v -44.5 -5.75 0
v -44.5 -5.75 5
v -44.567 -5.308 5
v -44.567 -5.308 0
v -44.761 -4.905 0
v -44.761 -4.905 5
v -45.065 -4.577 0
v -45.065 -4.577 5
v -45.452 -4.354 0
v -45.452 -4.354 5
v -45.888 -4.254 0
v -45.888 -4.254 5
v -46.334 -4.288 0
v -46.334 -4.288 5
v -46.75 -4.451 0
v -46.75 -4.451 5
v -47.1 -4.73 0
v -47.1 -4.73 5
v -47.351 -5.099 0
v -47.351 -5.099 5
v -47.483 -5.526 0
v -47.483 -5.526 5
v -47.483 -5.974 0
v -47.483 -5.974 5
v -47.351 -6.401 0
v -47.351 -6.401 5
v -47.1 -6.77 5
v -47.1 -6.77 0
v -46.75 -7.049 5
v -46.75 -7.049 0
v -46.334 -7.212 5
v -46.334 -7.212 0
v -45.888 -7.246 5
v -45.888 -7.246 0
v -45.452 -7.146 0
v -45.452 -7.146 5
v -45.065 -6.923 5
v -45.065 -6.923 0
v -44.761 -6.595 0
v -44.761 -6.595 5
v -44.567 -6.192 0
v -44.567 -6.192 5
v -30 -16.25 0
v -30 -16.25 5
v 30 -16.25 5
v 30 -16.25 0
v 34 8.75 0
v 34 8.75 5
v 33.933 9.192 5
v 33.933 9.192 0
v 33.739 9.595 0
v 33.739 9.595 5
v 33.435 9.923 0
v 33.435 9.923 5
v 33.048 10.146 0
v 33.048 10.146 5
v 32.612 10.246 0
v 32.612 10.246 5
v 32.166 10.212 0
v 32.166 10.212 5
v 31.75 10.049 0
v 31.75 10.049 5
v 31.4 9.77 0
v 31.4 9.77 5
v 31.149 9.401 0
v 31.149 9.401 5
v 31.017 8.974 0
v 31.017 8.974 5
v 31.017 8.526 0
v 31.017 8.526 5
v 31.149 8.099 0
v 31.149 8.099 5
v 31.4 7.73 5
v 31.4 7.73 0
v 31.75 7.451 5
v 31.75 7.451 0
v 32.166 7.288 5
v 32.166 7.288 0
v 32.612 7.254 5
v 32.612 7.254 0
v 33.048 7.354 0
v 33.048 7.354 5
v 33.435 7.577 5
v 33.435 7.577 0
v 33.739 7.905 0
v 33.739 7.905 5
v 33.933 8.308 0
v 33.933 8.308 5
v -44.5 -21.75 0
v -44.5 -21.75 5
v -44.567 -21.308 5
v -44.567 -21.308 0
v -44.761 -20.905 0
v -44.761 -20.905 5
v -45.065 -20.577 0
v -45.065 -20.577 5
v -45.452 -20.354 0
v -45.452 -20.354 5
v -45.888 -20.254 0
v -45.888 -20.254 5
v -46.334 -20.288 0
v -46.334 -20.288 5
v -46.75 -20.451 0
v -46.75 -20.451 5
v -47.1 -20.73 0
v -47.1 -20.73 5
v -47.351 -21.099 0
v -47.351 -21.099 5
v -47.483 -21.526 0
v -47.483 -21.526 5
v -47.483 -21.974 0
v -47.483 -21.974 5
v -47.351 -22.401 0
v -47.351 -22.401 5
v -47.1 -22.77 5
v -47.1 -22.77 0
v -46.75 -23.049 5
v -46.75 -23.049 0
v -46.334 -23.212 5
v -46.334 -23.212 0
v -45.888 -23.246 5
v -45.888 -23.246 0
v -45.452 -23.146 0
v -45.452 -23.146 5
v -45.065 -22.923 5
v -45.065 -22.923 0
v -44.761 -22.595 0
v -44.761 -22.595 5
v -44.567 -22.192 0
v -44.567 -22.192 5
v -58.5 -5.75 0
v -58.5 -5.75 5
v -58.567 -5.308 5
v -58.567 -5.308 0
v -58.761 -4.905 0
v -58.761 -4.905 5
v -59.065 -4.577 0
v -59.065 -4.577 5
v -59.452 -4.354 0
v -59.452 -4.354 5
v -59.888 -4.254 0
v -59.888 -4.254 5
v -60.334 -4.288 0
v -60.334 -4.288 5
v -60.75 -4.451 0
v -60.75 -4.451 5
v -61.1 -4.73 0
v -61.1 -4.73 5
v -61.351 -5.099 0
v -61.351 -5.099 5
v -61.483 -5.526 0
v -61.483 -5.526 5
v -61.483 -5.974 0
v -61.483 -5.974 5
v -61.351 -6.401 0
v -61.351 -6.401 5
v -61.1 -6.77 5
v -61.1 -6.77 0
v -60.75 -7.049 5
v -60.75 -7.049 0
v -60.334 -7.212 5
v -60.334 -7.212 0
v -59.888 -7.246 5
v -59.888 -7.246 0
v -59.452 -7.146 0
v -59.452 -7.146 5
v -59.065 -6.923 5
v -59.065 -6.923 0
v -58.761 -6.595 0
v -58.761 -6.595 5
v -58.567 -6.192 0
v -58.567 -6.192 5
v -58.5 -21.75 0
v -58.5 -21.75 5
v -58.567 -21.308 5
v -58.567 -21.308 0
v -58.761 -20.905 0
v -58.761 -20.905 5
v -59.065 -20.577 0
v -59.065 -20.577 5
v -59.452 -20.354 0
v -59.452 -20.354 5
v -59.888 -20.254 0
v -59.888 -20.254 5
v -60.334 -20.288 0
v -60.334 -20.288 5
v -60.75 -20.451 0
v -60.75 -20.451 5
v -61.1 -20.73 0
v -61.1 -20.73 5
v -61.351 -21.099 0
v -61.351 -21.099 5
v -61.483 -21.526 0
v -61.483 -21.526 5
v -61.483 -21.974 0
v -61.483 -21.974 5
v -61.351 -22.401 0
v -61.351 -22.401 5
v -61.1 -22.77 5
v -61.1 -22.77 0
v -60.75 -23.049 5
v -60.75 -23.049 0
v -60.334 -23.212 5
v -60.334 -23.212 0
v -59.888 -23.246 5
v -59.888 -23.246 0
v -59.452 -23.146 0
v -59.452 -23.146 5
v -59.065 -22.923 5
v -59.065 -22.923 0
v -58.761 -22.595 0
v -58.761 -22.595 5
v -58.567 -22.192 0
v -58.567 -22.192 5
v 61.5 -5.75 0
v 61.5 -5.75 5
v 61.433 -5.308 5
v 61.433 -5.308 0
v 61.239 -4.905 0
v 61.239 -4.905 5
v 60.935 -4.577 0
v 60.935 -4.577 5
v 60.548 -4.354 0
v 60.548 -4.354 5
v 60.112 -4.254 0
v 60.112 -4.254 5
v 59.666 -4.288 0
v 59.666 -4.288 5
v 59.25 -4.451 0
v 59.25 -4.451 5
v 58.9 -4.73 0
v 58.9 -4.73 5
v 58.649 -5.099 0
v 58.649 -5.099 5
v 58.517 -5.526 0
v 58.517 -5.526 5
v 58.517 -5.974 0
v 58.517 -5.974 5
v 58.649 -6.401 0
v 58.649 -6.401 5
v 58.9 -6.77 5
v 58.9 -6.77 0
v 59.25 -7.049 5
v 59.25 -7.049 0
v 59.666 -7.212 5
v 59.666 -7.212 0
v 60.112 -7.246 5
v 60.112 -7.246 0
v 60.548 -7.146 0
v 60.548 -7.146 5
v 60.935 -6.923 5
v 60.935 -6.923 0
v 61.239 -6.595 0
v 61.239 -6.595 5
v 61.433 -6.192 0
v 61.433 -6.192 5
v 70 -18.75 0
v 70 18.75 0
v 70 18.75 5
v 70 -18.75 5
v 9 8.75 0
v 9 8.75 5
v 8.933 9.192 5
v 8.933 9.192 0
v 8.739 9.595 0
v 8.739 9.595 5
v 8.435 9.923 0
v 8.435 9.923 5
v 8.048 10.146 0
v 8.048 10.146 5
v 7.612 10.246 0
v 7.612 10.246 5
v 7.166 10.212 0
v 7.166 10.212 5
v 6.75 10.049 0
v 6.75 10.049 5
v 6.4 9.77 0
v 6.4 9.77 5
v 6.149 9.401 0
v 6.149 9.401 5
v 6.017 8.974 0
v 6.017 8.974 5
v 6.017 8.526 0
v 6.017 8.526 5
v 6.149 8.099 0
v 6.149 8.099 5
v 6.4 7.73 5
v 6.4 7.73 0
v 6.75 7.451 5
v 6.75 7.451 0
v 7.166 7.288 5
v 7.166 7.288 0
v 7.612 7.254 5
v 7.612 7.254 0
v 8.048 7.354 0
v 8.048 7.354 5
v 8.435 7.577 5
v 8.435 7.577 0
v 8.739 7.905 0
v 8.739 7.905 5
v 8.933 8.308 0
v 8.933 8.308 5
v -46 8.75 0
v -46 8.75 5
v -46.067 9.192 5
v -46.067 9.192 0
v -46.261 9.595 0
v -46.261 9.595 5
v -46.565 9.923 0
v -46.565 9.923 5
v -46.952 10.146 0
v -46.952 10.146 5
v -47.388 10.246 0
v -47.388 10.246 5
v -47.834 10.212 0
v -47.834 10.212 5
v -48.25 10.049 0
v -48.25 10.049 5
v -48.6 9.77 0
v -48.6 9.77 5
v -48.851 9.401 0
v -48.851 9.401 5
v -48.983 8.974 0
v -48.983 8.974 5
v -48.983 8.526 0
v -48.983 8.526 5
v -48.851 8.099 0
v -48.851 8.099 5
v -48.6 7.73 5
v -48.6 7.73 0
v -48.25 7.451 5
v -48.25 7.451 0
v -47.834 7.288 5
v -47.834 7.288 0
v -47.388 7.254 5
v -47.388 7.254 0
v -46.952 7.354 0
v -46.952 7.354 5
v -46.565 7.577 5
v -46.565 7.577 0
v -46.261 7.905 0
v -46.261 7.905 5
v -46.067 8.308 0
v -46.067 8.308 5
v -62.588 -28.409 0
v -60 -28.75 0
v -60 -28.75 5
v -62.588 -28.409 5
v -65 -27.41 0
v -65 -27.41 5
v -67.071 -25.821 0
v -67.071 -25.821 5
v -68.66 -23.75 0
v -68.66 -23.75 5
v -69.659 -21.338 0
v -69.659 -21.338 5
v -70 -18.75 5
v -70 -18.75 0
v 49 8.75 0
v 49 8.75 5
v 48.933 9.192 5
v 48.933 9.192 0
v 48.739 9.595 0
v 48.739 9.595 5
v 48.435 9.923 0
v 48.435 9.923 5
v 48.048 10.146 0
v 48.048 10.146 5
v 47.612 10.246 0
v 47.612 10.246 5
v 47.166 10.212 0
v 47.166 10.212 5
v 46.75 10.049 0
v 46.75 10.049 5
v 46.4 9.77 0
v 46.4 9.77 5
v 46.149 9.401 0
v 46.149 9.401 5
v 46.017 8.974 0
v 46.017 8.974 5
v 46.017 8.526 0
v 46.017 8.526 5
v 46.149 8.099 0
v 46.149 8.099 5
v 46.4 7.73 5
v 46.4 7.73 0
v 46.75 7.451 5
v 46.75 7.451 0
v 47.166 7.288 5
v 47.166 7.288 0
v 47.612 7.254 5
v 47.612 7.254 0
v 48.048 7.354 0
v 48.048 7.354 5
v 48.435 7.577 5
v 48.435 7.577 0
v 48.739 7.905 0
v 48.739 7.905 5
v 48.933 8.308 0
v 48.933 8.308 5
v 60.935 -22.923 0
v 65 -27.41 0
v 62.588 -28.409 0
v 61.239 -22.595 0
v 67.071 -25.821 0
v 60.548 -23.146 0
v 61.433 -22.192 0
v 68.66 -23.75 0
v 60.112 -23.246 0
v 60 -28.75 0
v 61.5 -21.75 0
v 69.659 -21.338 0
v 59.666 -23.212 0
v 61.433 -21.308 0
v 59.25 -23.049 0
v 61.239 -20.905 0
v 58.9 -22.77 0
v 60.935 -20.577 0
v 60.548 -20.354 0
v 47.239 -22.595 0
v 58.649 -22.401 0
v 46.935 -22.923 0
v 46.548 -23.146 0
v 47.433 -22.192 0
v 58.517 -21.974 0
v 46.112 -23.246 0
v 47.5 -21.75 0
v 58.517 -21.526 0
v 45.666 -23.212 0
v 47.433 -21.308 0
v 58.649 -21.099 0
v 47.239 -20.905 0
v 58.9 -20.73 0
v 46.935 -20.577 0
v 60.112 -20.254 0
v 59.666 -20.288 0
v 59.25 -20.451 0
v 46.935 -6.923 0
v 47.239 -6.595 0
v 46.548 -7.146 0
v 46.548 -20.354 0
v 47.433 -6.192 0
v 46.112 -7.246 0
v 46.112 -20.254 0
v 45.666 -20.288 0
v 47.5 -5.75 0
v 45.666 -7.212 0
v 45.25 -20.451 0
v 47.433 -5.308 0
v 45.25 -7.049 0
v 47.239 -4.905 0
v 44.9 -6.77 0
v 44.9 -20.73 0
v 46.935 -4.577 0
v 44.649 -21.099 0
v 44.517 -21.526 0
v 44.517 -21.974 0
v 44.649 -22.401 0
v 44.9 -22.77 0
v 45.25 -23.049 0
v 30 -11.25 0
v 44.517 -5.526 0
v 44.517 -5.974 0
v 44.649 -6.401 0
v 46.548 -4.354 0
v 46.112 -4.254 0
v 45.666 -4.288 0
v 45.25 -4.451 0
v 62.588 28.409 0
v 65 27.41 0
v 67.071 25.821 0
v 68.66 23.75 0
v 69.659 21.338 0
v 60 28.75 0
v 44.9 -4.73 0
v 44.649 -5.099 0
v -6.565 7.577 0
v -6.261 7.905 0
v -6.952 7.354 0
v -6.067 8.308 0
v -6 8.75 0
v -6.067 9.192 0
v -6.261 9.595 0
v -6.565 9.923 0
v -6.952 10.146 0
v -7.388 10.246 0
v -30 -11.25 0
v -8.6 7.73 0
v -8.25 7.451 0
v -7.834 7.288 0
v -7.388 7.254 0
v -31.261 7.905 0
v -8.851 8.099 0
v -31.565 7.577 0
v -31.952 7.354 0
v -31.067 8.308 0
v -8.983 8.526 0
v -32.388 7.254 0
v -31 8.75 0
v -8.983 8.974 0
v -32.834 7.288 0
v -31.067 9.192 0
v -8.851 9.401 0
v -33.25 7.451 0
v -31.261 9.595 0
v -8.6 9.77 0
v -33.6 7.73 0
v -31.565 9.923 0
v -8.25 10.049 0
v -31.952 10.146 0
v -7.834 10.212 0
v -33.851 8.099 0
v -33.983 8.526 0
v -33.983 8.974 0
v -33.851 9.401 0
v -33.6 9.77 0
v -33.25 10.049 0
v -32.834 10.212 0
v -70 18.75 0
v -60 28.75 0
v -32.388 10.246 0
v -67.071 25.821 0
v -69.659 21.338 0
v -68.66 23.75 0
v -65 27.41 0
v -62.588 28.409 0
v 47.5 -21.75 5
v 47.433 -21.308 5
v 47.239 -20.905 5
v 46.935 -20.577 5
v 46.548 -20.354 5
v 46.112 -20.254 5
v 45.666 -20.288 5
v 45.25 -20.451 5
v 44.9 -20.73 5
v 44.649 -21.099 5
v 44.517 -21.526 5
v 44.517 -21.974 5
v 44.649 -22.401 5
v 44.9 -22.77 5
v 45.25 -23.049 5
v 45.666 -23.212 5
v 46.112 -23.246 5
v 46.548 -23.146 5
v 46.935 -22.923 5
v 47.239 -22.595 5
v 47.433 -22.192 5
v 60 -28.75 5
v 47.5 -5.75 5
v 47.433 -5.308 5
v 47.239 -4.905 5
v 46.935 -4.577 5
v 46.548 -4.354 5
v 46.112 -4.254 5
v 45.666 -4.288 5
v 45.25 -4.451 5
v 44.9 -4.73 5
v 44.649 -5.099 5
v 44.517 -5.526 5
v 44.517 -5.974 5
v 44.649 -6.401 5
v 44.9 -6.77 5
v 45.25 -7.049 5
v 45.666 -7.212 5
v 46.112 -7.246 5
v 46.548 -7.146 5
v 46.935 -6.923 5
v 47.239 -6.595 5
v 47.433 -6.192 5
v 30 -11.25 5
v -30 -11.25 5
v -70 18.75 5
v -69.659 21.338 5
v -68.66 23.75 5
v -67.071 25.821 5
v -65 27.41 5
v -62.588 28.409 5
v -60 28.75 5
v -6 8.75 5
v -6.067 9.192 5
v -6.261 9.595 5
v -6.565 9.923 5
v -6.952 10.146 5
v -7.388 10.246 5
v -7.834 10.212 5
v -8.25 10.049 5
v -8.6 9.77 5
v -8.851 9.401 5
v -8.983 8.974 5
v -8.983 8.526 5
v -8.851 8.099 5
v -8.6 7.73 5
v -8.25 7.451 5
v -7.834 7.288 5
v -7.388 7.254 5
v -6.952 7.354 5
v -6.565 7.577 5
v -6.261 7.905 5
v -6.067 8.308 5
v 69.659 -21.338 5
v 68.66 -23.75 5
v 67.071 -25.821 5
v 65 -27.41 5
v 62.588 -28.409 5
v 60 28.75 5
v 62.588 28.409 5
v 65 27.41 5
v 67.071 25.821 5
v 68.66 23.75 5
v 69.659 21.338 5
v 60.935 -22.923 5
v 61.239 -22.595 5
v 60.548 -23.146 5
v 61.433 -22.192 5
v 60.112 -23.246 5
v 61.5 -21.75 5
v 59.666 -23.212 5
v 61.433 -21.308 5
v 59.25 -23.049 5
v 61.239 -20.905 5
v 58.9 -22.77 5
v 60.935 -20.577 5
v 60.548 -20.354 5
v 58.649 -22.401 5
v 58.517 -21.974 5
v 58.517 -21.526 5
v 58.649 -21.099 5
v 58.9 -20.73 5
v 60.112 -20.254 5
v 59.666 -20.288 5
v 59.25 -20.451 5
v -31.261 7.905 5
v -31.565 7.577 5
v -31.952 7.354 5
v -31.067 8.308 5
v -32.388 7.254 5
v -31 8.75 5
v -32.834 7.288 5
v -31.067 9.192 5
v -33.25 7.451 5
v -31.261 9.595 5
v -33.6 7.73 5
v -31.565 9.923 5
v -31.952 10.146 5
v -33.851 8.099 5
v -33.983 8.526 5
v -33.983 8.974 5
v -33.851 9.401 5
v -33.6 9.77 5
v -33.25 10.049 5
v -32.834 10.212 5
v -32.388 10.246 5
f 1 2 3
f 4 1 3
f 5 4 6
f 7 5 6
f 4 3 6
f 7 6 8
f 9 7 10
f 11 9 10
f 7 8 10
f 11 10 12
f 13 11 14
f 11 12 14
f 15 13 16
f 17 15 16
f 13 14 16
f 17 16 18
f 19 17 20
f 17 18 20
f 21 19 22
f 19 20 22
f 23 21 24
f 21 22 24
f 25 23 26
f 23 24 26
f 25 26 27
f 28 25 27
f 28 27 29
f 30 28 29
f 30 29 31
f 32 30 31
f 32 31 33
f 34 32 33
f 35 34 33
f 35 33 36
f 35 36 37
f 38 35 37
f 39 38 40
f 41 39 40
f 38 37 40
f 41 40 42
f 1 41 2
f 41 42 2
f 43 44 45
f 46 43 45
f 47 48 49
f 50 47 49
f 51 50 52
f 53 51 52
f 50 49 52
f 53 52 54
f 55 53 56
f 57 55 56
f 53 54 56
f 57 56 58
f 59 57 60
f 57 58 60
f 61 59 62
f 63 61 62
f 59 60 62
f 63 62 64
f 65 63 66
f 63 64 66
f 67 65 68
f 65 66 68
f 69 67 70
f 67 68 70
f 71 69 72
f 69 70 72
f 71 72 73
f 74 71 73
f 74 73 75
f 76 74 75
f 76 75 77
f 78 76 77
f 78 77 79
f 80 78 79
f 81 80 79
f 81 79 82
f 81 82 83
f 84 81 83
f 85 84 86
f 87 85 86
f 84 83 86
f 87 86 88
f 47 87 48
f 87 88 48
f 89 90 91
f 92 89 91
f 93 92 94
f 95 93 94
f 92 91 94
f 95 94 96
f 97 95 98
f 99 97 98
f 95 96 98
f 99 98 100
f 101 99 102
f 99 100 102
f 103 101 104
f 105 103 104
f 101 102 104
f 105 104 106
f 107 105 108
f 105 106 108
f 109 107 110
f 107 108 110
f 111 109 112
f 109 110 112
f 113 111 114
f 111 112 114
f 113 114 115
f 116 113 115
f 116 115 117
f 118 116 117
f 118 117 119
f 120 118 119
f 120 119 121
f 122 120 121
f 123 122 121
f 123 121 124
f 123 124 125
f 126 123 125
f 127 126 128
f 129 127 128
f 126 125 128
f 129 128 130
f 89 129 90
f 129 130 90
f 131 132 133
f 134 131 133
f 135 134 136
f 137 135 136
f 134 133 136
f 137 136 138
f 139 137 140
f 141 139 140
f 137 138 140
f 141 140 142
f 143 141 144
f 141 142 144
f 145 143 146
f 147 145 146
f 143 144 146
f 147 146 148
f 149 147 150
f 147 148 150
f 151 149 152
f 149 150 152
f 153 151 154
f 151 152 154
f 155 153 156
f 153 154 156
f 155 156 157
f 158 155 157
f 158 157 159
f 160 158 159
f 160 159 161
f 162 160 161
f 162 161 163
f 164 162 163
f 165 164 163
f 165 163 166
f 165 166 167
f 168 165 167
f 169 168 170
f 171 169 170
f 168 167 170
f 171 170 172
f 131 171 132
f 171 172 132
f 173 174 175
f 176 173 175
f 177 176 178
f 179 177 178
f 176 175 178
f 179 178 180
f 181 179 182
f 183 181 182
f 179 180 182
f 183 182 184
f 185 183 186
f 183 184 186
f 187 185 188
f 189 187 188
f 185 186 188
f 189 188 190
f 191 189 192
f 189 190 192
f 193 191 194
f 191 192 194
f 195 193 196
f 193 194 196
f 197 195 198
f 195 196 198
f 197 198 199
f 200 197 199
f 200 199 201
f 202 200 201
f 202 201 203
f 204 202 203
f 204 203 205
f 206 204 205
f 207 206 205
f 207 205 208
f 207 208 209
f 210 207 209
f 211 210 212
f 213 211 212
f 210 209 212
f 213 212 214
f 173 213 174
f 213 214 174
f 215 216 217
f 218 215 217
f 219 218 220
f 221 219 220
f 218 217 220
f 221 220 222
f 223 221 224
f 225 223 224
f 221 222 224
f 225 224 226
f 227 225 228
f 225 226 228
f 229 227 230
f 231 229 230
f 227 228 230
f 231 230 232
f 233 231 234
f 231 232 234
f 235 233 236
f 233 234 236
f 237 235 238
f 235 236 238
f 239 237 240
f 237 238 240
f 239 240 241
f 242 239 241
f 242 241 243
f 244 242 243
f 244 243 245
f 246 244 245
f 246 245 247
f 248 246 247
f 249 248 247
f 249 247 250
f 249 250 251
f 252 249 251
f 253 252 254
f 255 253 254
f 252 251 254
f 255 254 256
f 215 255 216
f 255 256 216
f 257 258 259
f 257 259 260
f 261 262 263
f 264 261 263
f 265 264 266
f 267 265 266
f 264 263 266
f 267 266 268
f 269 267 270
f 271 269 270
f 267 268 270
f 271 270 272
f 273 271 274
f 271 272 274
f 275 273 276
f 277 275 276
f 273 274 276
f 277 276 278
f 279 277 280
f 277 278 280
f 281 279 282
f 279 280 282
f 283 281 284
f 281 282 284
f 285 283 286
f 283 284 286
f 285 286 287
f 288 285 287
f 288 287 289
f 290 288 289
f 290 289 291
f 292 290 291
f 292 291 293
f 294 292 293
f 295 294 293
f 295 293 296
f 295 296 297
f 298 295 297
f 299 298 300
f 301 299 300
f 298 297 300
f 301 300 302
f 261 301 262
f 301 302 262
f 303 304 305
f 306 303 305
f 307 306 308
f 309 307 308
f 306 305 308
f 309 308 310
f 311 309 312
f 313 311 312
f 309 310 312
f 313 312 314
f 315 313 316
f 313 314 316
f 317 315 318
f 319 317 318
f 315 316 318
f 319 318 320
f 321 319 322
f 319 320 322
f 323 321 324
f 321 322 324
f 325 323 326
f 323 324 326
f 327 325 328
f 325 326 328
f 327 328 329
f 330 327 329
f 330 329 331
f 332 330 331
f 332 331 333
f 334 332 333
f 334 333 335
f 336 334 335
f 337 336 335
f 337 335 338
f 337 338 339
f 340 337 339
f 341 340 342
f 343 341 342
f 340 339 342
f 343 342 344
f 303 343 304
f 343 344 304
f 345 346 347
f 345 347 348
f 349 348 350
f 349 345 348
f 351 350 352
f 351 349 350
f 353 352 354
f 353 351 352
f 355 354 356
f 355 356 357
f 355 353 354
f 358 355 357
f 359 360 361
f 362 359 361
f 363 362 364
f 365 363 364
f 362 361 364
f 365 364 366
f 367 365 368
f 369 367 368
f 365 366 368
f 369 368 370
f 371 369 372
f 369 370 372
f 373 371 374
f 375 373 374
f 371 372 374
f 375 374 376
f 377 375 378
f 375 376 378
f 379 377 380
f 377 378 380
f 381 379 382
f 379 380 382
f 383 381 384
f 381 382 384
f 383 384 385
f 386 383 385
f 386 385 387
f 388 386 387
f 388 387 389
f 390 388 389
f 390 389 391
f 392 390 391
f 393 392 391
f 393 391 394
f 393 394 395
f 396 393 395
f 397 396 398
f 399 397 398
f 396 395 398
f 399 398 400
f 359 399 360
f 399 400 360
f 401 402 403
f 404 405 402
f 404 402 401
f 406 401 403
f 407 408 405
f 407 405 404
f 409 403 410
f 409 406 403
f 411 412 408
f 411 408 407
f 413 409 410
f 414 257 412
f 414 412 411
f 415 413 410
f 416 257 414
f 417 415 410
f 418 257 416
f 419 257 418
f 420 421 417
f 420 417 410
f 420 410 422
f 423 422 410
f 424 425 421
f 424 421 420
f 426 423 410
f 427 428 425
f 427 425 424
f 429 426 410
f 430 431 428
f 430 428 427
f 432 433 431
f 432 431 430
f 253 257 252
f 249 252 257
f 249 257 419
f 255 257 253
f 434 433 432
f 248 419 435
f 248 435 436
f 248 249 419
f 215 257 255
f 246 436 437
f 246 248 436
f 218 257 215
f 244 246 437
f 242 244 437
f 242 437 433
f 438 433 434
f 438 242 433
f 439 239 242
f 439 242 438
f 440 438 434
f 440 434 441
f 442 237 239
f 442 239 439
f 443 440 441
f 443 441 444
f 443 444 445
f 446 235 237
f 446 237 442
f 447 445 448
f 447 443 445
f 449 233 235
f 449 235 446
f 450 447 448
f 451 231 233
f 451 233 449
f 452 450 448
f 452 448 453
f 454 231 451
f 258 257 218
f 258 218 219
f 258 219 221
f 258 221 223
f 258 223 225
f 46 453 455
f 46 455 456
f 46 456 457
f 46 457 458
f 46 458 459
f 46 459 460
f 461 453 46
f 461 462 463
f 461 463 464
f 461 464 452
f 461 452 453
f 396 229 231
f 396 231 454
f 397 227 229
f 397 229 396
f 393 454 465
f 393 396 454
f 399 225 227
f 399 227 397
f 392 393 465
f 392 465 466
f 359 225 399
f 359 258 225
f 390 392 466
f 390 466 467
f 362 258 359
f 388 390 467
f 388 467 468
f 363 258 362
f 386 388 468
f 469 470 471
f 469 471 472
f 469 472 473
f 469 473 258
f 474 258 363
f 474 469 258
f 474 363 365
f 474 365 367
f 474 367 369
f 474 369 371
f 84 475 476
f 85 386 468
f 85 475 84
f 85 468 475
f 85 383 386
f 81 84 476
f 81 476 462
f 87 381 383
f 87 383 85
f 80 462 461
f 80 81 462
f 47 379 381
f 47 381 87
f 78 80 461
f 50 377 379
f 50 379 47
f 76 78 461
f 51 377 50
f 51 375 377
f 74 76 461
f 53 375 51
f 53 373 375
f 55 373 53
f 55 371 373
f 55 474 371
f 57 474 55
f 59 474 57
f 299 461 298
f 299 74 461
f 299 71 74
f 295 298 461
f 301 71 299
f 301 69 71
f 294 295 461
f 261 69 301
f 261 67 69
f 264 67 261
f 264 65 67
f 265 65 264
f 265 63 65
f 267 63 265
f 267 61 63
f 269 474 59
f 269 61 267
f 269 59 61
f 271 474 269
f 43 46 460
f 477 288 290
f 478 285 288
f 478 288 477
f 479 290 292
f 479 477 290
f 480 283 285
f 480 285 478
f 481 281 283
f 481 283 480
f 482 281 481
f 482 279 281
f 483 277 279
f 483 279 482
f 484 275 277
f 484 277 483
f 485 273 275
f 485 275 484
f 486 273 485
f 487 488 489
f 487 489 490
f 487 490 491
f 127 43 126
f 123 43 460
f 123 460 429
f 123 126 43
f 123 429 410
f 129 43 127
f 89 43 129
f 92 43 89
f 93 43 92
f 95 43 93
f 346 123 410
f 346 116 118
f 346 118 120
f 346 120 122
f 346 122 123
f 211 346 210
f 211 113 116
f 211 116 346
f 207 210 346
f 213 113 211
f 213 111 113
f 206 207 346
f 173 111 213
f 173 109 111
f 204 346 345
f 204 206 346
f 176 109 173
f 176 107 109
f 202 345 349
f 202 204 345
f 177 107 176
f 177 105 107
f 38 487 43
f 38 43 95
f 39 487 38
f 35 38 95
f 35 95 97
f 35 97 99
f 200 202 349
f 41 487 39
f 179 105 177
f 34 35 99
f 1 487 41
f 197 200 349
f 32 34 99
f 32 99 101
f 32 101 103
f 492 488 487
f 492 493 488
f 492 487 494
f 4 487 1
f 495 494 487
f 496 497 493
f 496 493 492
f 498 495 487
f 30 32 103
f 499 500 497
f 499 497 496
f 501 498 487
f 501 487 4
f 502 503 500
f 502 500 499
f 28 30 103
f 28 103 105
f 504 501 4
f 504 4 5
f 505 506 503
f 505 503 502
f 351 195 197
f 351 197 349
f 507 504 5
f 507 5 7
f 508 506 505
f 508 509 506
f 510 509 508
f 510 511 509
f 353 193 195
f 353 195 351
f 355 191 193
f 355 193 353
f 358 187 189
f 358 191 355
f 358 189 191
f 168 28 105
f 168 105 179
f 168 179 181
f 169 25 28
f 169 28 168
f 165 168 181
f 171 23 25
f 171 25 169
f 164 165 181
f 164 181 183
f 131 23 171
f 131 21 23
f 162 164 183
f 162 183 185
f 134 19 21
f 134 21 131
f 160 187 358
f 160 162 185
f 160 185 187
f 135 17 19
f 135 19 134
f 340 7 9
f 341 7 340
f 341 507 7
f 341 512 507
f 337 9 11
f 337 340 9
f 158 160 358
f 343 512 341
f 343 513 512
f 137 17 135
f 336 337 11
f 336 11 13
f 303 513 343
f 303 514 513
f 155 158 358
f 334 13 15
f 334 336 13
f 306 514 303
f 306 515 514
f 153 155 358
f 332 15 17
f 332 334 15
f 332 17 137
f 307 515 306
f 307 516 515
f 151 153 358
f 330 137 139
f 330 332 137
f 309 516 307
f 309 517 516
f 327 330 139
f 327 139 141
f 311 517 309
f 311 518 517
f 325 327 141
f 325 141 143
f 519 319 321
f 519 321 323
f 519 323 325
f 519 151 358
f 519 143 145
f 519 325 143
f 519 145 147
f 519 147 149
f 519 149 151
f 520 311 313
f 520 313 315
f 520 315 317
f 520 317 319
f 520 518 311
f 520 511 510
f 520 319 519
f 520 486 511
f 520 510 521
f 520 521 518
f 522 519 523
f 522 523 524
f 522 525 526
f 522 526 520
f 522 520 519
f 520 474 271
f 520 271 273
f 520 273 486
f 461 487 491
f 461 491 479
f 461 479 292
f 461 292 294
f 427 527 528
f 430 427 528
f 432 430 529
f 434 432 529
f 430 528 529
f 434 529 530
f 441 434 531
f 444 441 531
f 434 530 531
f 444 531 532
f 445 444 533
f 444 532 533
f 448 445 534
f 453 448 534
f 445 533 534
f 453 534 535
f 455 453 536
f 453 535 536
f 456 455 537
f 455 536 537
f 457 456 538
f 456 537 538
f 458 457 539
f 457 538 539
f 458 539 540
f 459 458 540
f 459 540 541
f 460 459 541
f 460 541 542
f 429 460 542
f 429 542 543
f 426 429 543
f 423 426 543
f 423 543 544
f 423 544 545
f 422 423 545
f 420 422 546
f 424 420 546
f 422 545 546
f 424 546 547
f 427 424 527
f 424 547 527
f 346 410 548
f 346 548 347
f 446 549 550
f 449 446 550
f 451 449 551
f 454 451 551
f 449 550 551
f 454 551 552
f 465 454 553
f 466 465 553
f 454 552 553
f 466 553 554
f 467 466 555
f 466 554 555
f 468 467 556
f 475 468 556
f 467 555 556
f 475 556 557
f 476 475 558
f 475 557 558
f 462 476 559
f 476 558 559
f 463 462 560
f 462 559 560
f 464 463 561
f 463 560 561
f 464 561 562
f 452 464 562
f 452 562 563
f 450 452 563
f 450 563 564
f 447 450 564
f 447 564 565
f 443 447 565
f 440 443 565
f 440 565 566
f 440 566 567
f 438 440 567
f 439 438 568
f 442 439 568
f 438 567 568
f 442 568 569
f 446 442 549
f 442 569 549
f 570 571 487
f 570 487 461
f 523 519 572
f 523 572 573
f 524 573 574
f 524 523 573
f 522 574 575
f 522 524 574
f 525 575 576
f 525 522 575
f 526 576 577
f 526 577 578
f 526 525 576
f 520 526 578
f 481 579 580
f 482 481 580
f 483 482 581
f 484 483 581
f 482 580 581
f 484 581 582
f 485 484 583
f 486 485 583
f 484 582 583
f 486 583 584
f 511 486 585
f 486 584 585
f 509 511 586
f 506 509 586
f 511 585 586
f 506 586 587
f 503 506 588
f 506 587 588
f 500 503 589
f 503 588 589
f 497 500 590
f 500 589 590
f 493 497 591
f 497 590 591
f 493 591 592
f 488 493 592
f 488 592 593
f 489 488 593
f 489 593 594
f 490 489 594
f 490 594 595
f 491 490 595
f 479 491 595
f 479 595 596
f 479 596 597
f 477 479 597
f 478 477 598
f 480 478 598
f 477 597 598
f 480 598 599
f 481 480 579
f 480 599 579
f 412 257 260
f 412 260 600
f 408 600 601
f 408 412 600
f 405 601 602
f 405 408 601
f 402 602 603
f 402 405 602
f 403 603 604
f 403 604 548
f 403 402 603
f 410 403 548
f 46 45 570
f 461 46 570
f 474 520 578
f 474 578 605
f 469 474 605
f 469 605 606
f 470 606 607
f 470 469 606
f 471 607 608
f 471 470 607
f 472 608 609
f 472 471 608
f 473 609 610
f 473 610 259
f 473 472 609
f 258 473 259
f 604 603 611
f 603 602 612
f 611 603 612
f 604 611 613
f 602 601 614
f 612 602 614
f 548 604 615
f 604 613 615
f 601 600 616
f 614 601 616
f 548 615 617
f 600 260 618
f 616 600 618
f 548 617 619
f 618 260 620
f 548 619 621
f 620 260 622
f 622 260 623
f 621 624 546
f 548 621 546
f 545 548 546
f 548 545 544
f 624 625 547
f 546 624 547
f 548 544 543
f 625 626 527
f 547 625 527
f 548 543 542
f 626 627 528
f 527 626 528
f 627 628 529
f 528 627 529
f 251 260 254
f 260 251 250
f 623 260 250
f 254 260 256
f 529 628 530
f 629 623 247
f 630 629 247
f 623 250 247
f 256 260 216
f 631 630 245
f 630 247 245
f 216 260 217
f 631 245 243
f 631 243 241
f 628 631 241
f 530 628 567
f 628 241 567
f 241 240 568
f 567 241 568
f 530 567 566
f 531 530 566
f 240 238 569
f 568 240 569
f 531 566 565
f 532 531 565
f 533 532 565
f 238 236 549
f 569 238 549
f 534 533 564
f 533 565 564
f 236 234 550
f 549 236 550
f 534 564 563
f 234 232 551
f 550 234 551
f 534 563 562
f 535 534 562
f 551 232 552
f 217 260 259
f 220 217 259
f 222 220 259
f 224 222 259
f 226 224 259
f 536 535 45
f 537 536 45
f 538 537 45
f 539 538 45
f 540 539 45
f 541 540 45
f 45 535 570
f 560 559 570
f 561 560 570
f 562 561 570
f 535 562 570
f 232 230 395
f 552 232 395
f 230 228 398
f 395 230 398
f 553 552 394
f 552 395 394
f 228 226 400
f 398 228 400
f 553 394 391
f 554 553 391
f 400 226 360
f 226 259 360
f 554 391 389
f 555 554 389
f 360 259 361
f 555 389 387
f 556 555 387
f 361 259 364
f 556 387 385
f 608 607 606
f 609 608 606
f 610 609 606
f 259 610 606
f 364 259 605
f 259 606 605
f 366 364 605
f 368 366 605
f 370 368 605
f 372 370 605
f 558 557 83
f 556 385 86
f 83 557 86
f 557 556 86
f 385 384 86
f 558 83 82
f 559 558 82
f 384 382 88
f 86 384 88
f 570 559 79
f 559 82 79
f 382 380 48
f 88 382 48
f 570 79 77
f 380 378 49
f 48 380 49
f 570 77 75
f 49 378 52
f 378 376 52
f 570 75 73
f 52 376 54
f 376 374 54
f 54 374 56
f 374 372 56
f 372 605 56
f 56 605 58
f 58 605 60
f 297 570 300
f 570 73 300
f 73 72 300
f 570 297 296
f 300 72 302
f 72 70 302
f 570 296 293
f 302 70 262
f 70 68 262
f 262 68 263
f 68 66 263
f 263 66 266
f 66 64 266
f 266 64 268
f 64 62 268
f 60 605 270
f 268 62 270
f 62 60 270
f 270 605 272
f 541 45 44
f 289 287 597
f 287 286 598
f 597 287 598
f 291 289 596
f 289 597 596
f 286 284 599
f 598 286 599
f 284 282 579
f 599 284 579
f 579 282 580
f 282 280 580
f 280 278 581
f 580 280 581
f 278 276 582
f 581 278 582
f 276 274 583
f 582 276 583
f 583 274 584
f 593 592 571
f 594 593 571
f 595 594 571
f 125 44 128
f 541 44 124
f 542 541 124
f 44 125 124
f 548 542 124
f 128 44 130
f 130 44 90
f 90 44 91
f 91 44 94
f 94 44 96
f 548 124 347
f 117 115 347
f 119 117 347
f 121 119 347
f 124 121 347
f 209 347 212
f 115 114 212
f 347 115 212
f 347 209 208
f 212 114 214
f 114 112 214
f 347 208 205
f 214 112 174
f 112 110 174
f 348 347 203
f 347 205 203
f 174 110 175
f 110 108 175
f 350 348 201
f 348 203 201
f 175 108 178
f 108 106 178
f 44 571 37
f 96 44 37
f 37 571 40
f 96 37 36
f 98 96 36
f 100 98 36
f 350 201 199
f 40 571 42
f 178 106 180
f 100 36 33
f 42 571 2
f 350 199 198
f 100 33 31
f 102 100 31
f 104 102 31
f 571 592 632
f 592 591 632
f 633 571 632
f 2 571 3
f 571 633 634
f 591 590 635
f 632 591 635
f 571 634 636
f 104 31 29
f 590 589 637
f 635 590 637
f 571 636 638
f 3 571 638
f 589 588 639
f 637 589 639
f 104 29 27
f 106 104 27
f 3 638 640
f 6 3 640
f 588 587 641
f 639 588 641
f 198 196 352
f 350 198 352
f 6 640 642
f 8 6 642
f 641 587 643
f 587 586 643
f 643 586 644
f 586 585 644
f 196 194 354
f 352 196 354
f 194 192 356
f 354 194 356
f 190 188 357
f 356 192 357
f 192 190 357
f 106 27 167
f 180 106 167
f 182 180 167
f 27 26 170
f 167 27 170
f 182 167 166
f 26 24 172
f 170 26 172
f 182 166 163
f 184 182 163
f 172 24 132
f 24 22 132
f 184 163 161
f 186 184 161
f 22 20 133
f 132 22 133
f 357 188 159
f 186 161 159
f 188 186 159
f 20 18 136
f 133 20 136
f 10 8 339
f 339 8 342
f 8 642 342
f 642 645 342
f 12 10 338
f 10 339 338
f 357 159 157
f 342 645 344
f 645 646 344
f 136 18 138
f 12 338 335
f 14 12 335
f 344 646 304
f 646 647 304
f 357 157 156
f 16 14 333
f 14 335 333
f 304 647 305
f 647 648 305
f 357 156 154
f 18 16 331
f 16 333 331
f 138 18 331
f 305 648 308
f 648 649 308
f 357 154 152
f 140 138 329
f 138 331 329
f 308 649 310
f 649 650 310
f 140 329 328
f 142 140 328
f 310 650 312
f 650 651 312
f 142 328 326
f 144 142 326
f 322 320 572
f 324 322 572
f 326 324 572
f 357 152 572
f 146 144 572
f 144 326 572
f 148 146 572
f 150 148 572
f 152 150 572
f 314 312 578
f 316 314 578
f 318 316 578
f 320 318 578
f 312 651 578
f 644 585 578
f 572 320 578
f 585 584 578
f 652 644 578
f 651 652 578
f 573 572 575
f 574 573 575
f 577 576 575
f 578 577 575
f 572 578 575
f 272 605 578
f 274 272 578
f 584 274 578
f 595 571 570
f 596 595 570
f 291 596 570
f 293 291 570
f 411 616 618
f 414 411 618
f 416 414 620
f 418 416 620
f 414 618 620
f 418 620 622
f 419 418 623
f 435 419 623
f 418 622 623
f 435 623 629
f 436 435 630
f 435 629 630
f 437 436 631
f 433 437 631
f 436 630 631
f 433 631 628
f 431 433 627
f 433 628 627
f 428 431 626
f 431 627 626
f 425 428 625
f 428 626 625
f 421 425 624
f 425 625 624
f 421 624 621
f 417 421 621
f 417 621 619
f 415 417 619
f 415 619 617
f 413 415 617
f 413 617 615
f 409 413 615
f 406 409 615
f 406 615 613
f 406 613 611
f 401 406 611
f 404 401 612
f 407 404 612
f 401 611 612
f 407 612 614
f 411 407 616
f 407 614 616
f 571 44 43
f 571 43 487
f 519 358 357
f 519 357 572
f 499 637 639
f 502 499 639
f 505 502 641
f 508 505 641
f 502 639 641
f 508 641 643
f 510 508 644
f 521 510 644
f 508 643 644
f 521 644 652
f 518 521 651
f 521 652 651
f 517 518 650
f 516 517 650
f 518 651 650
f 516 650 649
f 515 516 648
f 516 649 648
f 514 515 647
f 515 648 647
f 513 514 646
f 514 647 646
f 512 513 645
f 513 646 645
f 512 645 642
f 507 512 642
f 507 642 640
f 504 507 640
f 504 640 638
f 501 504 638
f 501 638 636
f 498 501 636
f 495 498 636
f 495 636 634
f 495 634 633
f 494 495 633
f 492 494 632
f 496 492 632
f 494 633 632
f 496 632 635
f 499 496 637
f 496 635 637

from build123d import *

# Parameters (mm, degrees)
BOSS_EXTRUDE1_DEPTH = 5
SKETCH2_R           = 1.5
SKETCH2_W           = 60
SKETCH2_H           = 5
CUT_EXTRUDE1_DEPTH  = 5
SKETCH4_R           = 1.5
CUT_EXTRUDE2_DEPTH  = 5


with BuildPart() as part:
    # Sketch1 → Boss-Extrude1 (new body)
    with BuildSketch(Plane.XY):
        with BuildLine():
            Line((-60, 28.75), (60, 28.75))
            ThreePointArc((60, 28.75), (67.071067812, 25.821067812), (70, 18.75))
            Line((70, 18.75), (70, -18.75))
            ThreePointArc((70, -18.75), (67.071067812, -25.821067812), (60, -28.75))
            Line((60, -28.75), (-60, -28.75))
            ThreePointArc((-60, -28.75), (-67.071067812, -25.821067812), (-70, -18.75))
            Line((-70, -18.75), (-70, 18.75))
            ThreePointArc((-70, 18.75), (-67.071067812, 25.821067812), (-60, 28.75))
        make_face()
    extrude(amount=BOSS_EXTRUDE1_DEPTH)

    # Sketch2 → Cut-Extrude1 (cut)
    with BuildSketch(Plane.XY.offset(5)):
        with Locations((60, -5.75)):
            Circle(SKETCH2_R)
        with Locations((46, -5.75)):
            Circle(SKETCH2_R)
        with Locations((46, -21.75)):
            Circle(SKETCH2_R)
        with Locations((60, -21.75)):
            Circle(SKETCH2_R)
        with Locations((-46, -5.75)):
            Circle(SKETCH2_R)
        with Locations((-46, -21.75)):
            Circle(SKETCH2_R)
        with Locations((-60, -21.75)):
            Circle(SKETCH2_R)
        with Locations((-60, -5.75)):
            Circle(SKETCH2_R)
        with Locations((0, -13.75)):
            Rectangle(SKETCH2_W, SKETCH2_H)
    extrude(amount=-CUT_EXTRUDE1_DEPTH, mode=Mode.SUBTRACT)

    # Sketch4 → Cut-Extrude2 (cut)
    with BuildSketch(Plane.XY.offset(5)):
        with Locations((7.5, 8.75)):
            Circle(SKETCH4_R)
        with Locations((-7.5, 8.75)):
            Circle(SKETCH4_R)
        with Locations((47.5, 8.75)):
            Circle(SKETCH4_R)
        with Locations((32.5, 8.75)):
            Circle(SKETCH4_R)
        with Locations((-32.5, 8.75)):
            Circle(SKETCH4_R)
        with Locations((-47.5, 8.75)):
            Circle(SKETCH4_R)
    extrude(amount=-CUT_EXTRUDE2_DEPTH, mode=Mode.SUBTRACT)


solid = part.part
